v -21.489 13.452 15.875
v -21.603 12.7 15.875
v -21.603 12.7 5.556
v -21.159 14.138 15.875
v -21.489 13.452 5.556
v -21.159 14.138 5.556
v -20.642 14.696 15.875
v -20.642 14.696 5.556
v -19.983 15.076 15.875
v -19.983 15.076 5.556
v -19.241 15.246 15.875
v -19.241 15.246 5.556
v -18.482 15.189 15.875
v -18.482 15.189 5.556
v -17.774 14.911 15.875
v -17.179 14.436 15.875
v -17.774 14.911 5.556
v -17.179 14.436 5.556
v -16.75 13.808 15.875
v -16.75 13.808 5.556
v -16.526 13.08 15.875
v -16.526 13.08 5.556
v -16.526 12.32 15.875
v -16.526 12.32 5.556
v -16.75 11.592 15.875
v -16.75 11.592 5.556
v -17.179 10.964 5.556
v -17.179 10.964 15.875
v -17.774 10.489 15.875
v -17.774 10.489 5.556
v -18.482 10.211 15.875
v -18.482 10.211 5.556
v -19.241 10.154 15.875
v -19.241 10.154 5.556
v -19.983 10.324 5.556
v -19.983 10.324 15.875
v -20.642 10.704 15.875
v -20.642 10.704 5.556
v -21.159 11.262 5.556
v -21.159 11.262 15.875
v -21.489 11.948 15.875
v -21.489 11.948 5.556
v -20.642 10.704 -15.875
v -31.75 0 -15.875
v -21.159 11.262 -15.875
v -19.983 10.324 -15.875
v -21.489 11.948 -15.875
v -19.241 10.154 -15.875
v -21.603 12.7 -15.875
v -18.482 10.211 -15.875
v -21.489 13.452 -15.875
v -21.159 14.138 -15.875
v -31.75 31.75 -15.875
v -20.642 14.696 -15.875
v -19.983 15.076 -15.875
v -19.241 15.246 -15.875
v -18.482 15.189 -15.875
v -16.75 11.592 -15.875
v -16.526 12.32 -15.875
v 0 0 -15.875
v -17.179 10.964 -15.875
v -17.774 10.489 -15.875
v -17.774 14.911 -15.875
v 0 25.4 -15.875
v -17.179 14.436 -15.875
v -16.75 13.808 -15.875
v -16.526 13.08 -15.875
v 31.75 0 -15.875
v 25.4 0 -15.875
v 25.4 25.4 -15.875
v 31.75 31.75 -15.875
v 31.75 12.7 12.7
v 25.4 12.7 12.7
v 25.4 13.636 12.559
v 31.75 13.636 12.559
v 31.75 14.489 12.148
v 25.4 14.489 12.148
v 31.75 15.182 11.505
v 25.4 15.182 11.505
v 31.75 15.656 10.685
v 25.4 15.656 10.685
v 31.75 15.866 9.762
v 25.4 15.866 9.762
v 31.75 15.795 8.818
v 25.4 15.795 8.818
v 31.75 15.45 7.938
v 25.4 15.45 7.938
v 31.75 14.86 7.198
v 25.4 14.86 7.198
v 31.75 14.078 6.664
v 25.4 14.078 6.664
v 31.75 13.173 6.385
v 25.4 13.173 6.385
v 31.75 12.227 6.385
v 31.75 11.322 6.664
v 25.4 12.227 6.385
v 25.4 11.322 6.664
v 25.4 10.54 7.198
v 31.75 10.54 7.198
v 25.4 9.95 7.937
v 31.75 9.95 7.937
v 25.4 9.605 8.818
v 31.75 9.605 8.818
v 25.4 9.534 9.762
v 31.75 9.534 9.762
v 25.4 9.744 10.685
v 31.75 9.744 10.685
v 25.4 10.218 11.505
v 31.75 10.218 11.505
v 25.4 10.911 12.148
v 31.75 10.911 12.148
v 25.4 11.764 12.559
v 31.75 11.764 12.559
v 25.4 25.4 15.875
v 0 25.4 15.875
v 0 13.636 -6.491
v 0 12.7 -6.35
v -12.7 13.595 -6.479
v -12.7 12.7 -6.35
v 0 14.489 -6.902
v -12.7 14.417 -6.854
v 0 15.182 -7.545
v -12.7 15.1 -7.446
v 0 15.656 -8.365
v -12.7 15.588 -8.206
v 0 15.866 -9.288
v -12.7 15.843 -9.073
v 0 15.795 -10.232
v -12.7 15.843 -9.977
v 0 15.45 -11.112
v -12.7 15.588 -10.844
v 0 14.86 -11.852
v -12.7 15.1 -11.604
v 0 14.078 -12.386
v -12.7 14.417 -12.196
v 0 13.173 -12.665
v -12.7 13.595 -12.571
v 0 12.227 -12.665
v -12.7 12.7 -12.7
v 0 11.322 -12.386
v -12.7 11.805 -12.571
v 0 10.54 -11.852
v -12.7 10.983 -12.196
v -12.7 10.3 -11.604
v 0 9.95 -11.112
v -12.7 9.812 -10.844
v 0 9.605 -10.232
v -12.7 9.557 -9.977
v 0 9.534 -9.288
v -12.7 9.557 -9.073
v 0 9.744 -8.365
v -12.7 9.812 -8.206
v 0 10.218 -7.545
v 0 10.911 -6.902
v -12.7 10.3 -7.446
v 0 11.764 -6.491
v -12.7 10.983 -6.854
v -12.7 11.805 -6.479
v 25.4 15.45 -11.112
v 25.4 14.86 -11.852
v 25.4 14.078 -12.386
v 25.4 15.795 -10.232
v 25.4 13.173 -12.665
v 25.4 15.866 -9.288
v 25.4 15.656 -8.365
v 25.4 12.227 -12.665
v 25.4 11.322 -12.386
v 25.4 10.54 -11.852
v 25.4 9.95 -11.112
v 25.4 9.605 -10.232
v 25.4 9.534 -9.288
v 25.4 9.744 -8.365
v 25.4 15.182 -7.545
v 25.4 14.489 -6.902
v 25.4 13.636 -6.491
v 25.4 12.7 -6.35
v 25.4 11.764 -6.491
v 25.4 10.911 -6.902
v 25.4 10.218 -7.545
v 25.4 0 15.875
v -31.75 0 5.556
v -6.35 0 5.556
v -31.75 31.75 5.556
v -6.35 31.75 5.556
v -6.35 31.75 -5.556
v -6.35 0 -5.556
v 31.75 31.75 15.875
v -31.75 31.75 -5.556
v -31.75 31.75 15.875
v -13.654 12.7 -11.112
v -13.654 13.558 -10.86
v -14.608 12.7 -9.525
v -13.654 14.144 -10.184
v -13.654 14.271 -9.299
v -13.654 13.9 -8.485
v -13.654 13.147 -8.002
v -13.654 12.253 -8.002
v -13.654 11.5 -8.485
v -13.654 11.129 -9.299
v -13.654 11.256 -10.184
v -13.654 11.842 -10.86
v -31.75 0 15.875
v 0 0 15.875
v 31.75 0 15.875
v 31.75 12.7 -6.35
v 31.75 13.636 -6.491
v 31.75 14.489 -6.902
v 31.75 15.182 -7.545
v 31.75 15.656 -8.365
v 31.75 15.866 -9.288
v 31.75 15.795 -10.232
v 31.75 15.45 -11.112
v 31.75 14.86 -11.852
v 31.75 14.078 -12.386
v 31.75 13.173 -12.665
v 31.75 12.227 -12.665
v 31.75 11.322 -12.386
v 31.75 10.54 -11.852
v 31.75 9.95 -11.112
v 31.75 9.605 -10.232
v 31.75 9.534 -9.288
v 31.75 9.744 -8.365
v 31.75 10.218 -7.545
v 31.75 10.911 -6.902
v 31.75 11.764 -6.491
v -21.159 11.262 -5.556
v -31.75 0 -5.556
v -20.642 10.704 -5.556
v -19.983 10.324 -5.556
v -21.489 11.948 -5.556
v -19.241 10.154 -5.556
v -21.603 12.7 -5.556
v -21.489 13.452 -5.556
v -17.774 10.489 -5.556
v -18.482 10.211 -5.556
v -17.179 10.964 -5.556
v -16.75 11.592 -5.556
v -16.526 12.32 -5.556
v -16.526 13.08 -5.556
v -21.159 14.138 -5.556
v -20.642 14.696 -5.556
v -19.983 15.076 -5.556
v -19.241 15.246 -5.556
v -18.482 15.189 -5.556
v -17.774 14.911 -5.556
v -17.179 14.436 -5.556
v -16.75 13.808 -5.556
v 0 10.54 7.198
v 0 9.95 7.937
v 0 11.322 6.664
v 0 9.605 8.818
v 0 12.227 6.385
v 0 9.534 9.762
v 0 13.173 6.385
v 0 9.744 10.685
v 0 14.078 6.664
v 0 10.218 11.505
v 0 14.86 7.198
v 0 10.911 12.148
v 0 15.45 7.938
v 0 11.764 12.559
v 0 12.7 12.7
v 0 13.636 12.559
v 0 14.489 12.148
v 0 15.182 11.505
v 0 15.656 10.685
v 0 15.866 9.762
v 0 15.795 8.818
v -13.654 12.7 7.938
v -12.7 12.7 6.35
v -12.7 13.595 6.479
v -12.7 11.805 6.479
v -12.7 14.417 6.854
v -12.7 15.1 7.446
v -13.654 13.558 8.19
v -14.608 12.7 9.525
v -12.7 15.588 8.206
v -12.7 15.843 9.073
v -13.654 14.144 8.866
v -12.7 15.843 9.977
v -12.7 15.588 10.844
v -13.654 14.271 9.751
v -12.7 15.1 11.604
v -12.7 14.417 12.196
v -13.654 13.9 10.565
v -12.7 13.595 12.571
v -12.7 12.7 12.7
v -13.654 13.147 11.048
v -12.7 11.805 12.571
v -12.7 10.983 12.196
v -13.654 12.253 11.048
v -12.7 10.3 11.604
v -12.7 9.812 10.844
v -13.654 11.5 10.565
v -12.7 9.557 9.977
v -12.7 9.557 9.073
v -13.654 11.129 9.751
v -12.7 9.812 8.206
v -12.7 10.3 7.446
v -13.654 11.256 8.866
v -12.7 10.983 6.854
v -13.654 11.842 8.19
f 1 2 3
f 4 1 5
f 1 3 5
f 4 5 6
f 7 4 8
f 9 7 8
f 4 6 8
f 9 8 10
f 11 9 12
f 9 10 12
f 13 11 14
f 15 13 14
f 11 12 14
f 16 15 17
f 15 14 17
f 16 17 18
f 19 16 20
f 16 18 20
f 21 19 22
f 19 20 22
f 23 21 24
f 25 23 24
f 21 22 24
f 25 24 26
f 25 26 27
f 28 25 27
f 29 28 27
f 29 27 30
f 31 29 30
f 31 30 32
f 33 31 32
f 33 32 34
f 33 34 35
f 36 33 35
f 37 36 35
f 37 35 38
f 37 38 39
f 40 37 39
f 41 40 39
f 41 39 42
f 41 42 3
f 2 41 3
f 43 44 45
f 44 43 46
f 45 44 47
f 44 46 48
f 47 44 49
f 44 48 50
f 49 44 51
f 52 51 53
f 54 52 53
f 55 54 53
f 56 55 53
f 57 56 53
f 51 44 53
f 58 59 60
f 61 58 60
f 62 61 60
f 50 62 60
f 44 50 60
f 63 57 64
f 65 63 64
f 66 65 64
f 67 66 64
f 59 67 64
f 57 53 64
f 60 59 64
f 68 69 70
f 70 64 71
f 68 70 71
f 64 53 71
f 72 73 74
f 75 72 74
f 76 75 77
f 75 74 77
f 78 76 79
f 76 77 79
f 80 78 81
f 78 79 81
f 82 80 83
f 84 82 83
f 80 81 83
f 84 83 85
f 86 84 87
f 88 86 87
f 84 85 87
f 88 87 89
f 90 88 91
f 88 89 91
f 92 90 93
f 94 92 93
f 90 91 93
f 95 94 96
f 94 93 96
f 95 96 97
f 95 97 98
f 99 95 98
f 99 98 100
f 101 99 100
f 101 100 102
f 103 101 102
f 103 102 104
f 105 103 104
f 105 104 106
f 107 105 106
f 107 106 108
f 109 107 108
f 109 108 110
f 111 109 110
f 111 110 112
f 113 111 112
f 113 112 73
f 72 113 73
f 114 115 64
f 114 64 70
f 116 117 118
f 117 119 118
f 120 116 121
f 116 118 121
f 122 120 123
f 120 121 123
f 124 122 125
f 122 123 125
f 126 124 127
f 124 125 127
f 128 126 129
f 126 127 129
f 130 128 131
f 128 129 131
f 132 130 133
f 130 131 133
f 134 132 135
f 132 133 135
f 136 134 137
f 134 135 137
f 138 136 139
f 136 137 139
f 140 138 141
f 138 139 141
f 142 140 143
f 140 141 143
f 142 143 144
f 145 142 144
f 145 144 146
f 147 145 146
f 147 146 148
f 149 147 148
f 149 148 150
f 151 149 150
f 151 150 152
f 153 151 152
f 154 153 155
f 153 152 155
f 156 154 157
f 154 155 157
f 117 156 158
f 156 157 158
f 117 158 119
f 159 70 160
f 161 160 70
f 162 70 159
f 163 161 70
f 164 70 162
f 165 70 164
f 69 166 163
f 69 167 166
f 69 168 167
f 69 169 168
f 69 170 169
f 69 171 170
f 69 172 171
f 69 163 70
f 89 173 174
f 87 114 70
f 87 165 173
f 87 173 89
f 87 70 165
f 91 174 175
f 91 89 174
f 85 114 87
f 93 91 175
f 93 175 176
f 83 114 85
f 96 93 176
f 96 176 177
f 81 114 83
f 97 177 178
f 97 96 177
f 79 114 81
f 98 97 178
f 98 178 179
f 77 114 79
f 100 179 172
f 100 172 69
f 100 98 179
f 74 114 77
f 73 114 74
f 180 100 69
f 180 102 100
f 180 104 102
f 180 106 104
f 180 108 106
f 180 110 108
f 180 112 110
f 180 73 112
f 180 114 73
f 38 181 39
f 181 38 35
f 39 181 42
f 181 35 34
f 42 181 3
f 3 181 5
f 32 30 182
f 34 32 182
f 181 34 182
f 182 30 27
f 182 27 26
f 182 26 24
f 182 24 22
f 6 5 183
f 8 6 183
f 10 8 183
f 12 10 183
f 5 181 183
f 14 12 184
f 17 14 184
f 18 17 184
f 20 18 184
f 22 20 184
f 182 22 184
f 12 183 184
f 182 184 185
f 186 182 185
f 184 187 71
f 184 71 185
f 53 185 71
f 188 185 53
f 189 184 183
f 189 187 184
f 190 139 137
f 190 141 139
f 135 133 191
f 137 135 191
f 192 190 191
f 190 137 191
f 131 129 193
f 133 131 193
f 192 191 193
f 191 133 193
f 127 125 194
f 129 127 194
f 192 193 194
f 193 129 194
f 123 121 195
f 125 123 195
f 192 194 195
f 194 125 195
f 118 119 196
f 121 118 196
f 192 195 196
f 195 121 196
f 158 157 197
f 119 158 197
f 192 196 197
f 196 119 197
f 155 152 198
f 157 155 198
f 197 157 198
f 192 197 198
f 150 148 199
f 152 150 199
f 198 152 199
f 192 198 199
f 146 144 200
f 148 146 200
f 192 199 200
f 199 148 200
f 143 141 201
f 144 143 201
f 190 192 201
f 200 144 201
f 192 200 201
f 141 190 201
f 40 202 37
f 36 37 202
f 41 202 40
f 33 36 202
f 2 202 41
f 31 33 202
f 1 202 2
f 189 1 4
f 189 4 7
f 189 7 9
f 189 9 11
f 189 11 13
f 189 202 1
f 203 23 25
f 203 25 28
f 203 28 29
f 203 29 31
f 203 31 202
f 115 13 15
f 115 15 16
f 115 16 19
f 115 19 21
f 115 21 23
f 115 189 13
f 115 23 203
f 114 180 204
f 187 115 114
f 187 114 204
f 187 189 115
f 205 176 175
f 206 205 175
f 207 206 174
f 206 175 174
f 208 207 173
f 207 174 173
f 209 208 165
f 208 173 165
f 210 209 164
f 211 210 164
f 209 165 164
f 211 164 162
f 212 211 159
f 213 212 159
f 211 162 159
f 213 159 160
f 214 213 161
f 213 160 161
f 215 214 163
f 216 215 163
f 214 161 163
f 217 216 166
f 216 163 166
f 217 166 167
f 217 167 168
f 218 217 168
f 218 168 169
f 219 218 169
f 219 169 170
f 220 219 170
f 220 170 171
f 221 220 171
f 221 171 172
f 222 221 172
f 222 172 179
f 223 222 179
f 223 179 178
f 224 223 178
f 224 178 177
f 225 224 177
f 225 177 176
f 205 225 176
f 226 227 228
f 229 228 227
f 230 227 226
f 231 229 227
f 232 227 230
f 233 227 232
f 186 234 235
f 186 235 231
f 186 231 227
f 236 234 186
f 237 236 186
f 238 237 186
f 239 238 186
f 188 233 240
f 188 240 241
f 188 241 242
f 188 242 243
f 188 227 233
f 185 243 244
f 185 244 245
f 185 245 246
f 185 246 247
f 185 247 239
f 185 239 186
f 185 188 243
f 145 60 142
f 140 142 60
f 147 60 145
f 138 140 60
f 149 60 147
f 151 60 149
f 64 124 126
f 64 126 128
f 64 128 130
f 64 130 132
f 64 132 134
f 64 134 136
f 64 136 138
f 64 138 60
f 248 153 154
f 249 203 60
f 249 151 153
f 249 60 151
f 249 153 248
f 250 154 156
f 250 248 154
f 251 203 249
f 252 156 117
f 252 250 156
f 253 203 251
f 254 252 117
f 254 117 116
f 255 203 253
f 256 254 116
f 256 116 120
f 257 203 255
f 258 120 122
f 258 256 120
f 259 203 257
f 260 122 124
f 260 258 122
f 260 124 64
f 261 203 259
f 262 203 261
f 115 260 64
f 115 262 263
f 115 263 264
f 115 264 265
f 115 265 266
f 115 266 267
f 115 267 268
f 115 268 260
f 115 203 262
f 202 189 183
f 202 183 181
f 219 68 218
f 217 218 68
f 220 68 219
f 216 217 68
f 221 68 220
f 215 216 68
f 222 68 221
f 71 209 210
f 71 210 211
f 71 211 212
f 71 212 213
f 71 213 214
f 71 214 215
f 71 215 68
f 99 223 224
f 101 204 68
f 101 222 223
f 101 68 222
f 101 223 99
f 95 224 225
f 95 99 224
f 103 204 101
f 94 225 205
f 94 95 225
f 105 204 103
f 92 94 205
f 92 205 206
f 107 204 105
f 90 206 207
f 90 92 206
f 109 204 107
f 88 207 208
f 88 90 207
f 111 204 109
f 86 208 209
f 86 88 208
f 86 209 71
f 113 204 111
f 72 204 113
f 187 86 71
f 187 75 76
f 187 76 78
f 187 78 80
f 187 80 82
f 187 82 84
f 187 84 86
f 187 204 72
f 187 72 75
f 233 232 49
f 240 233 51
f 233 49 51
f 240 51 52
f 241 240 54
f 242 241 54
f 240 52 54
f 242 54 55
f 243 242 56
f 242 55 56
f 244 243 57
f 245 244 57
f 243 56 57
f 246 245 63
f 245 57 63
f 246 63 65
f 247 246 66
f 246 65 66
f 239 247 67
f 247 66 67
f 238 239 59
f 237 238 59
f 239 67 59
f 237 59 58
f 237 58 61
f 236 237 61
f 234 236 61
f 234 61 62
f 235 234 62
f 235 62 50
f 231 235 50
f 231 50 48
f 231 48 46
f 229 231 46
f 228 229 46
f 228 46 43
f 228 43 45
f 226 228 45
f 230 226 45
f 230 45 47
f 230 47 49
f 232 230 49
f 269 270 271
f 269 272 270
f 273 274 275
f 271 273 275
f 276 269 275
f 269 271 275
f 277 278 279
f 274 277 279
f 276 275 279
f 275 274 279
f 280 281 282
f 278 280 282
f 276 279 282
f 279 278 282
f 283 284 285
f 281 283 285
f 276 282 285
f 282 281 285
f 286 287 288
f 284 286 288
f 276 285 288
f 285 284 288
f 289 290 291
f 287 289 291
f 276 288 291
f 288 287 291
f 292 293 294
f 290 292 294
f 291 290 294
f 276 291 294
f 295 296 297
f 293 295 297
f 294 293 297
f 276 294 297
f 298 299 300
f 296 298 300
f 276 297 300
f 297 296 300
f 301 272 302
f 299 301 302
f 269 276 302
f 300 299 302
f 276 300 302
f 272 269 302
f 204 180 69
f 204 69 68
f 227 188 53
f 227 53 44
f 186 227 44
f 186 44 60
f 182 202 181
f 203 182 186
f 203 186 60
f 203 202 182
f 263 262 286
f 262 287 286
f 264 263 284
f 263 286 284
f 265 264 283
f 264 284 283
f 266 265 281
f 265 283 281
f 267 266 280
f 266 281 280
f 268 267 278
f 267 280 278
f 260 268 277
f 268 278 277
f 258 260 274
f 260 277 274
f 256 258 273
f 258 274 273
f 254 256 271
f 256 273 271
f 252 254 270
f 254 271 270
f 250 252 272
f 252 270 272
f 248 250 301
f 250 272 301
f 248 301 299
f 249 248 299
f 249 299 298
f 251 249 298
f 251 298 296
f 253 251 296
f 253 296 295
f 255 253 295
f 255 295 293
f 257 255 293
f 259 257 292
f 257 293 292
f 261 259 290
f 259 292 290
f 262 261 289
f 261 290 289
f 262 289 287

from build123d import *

# Parameters (mm, degrees)
BOSS_EXTRUDE1_DEPTH             = 15.875
SKETCH2_W                       = 25.4
SKETCH2_H                       = 11.1125
CUT_EXTRUDE1_DEPTH              = 32.75
F_1_4_0_25_DIAMETER_HOLE1_D     = 6.35
F_1_4_0_25_DIAMETER_HOLE1_DEPTH = 44.45
F_1_4_0_25_DIAMETER_HOLE1_TIP   = 1.907732465
F_10_CLEARANCE_HOLE1_D          = 5.1054


with BuildPart() as part:
    # Sketch1 → Boss-Extrude1 (new body, symmetric)
    with BuildSketch(Plane.XY):
        Polygon((0, 0), (0, 25.4), (25.4, 25.4), (25.4, 0), (31.75, 0), (31.75, 31.75), (-31.75, 31.75), (-31.75, 0), align=None)
    extrude(amount=BOSS_EXTRUDE1_DEPTH, both=True)

    # Sketch2 → Cut-Extrude1 (cut, through all)
    with BuildSketch(Plane(origin=(0, 31.75, 0), x_dir=(1, 0, 0), z_dir=(0, 1, 0))):
        with Locations((-19.05, 0)):
            Rectangle(SKETCH2_W, SKETCH2_H)
    extrude(amount=-CUT_EXTRUDE1_DEPTH, mode=Mode.SUBTRACT)

    # 1/4 (0.25) Diameter Hole1
    with Locations(Plane(origin=(31.75, 0, 0), x_dir=(0, 0, -1), z_dir=(1, 0, 0))):
        with Locations((-9.525, 12.7), (9.525, 12.7)):
            Hole(F_1_4_0_25_DIAMETER_HOLE1_D / 2, depth=F_1_4_0_25_DIAMETER_HOLE1_DEPTH)
            with Locations((0, 0, -(F_1_4_0_25_DIAMETER_HOLE1_DEPTH + F_1_4_0_25_DIAMETER_HOLE1_TIP / 2))):  # 118° drill point
                Cone(0, F_1_4_0_25_DIAMETER_HOLE1_D / 2, F_1_4_0_25_DIAMETER_HOLE1_TIP, mode=Mode.SUBTRACT)

    # #10 Clearance Hole1 (through all)
    with Locations(Plane.XY.offset(15.875)):
        with Locations((-19.05, 12.7)):
            Hole(F_10_CLEARANCE_HOLE1_D / 2)


solid = part.part
